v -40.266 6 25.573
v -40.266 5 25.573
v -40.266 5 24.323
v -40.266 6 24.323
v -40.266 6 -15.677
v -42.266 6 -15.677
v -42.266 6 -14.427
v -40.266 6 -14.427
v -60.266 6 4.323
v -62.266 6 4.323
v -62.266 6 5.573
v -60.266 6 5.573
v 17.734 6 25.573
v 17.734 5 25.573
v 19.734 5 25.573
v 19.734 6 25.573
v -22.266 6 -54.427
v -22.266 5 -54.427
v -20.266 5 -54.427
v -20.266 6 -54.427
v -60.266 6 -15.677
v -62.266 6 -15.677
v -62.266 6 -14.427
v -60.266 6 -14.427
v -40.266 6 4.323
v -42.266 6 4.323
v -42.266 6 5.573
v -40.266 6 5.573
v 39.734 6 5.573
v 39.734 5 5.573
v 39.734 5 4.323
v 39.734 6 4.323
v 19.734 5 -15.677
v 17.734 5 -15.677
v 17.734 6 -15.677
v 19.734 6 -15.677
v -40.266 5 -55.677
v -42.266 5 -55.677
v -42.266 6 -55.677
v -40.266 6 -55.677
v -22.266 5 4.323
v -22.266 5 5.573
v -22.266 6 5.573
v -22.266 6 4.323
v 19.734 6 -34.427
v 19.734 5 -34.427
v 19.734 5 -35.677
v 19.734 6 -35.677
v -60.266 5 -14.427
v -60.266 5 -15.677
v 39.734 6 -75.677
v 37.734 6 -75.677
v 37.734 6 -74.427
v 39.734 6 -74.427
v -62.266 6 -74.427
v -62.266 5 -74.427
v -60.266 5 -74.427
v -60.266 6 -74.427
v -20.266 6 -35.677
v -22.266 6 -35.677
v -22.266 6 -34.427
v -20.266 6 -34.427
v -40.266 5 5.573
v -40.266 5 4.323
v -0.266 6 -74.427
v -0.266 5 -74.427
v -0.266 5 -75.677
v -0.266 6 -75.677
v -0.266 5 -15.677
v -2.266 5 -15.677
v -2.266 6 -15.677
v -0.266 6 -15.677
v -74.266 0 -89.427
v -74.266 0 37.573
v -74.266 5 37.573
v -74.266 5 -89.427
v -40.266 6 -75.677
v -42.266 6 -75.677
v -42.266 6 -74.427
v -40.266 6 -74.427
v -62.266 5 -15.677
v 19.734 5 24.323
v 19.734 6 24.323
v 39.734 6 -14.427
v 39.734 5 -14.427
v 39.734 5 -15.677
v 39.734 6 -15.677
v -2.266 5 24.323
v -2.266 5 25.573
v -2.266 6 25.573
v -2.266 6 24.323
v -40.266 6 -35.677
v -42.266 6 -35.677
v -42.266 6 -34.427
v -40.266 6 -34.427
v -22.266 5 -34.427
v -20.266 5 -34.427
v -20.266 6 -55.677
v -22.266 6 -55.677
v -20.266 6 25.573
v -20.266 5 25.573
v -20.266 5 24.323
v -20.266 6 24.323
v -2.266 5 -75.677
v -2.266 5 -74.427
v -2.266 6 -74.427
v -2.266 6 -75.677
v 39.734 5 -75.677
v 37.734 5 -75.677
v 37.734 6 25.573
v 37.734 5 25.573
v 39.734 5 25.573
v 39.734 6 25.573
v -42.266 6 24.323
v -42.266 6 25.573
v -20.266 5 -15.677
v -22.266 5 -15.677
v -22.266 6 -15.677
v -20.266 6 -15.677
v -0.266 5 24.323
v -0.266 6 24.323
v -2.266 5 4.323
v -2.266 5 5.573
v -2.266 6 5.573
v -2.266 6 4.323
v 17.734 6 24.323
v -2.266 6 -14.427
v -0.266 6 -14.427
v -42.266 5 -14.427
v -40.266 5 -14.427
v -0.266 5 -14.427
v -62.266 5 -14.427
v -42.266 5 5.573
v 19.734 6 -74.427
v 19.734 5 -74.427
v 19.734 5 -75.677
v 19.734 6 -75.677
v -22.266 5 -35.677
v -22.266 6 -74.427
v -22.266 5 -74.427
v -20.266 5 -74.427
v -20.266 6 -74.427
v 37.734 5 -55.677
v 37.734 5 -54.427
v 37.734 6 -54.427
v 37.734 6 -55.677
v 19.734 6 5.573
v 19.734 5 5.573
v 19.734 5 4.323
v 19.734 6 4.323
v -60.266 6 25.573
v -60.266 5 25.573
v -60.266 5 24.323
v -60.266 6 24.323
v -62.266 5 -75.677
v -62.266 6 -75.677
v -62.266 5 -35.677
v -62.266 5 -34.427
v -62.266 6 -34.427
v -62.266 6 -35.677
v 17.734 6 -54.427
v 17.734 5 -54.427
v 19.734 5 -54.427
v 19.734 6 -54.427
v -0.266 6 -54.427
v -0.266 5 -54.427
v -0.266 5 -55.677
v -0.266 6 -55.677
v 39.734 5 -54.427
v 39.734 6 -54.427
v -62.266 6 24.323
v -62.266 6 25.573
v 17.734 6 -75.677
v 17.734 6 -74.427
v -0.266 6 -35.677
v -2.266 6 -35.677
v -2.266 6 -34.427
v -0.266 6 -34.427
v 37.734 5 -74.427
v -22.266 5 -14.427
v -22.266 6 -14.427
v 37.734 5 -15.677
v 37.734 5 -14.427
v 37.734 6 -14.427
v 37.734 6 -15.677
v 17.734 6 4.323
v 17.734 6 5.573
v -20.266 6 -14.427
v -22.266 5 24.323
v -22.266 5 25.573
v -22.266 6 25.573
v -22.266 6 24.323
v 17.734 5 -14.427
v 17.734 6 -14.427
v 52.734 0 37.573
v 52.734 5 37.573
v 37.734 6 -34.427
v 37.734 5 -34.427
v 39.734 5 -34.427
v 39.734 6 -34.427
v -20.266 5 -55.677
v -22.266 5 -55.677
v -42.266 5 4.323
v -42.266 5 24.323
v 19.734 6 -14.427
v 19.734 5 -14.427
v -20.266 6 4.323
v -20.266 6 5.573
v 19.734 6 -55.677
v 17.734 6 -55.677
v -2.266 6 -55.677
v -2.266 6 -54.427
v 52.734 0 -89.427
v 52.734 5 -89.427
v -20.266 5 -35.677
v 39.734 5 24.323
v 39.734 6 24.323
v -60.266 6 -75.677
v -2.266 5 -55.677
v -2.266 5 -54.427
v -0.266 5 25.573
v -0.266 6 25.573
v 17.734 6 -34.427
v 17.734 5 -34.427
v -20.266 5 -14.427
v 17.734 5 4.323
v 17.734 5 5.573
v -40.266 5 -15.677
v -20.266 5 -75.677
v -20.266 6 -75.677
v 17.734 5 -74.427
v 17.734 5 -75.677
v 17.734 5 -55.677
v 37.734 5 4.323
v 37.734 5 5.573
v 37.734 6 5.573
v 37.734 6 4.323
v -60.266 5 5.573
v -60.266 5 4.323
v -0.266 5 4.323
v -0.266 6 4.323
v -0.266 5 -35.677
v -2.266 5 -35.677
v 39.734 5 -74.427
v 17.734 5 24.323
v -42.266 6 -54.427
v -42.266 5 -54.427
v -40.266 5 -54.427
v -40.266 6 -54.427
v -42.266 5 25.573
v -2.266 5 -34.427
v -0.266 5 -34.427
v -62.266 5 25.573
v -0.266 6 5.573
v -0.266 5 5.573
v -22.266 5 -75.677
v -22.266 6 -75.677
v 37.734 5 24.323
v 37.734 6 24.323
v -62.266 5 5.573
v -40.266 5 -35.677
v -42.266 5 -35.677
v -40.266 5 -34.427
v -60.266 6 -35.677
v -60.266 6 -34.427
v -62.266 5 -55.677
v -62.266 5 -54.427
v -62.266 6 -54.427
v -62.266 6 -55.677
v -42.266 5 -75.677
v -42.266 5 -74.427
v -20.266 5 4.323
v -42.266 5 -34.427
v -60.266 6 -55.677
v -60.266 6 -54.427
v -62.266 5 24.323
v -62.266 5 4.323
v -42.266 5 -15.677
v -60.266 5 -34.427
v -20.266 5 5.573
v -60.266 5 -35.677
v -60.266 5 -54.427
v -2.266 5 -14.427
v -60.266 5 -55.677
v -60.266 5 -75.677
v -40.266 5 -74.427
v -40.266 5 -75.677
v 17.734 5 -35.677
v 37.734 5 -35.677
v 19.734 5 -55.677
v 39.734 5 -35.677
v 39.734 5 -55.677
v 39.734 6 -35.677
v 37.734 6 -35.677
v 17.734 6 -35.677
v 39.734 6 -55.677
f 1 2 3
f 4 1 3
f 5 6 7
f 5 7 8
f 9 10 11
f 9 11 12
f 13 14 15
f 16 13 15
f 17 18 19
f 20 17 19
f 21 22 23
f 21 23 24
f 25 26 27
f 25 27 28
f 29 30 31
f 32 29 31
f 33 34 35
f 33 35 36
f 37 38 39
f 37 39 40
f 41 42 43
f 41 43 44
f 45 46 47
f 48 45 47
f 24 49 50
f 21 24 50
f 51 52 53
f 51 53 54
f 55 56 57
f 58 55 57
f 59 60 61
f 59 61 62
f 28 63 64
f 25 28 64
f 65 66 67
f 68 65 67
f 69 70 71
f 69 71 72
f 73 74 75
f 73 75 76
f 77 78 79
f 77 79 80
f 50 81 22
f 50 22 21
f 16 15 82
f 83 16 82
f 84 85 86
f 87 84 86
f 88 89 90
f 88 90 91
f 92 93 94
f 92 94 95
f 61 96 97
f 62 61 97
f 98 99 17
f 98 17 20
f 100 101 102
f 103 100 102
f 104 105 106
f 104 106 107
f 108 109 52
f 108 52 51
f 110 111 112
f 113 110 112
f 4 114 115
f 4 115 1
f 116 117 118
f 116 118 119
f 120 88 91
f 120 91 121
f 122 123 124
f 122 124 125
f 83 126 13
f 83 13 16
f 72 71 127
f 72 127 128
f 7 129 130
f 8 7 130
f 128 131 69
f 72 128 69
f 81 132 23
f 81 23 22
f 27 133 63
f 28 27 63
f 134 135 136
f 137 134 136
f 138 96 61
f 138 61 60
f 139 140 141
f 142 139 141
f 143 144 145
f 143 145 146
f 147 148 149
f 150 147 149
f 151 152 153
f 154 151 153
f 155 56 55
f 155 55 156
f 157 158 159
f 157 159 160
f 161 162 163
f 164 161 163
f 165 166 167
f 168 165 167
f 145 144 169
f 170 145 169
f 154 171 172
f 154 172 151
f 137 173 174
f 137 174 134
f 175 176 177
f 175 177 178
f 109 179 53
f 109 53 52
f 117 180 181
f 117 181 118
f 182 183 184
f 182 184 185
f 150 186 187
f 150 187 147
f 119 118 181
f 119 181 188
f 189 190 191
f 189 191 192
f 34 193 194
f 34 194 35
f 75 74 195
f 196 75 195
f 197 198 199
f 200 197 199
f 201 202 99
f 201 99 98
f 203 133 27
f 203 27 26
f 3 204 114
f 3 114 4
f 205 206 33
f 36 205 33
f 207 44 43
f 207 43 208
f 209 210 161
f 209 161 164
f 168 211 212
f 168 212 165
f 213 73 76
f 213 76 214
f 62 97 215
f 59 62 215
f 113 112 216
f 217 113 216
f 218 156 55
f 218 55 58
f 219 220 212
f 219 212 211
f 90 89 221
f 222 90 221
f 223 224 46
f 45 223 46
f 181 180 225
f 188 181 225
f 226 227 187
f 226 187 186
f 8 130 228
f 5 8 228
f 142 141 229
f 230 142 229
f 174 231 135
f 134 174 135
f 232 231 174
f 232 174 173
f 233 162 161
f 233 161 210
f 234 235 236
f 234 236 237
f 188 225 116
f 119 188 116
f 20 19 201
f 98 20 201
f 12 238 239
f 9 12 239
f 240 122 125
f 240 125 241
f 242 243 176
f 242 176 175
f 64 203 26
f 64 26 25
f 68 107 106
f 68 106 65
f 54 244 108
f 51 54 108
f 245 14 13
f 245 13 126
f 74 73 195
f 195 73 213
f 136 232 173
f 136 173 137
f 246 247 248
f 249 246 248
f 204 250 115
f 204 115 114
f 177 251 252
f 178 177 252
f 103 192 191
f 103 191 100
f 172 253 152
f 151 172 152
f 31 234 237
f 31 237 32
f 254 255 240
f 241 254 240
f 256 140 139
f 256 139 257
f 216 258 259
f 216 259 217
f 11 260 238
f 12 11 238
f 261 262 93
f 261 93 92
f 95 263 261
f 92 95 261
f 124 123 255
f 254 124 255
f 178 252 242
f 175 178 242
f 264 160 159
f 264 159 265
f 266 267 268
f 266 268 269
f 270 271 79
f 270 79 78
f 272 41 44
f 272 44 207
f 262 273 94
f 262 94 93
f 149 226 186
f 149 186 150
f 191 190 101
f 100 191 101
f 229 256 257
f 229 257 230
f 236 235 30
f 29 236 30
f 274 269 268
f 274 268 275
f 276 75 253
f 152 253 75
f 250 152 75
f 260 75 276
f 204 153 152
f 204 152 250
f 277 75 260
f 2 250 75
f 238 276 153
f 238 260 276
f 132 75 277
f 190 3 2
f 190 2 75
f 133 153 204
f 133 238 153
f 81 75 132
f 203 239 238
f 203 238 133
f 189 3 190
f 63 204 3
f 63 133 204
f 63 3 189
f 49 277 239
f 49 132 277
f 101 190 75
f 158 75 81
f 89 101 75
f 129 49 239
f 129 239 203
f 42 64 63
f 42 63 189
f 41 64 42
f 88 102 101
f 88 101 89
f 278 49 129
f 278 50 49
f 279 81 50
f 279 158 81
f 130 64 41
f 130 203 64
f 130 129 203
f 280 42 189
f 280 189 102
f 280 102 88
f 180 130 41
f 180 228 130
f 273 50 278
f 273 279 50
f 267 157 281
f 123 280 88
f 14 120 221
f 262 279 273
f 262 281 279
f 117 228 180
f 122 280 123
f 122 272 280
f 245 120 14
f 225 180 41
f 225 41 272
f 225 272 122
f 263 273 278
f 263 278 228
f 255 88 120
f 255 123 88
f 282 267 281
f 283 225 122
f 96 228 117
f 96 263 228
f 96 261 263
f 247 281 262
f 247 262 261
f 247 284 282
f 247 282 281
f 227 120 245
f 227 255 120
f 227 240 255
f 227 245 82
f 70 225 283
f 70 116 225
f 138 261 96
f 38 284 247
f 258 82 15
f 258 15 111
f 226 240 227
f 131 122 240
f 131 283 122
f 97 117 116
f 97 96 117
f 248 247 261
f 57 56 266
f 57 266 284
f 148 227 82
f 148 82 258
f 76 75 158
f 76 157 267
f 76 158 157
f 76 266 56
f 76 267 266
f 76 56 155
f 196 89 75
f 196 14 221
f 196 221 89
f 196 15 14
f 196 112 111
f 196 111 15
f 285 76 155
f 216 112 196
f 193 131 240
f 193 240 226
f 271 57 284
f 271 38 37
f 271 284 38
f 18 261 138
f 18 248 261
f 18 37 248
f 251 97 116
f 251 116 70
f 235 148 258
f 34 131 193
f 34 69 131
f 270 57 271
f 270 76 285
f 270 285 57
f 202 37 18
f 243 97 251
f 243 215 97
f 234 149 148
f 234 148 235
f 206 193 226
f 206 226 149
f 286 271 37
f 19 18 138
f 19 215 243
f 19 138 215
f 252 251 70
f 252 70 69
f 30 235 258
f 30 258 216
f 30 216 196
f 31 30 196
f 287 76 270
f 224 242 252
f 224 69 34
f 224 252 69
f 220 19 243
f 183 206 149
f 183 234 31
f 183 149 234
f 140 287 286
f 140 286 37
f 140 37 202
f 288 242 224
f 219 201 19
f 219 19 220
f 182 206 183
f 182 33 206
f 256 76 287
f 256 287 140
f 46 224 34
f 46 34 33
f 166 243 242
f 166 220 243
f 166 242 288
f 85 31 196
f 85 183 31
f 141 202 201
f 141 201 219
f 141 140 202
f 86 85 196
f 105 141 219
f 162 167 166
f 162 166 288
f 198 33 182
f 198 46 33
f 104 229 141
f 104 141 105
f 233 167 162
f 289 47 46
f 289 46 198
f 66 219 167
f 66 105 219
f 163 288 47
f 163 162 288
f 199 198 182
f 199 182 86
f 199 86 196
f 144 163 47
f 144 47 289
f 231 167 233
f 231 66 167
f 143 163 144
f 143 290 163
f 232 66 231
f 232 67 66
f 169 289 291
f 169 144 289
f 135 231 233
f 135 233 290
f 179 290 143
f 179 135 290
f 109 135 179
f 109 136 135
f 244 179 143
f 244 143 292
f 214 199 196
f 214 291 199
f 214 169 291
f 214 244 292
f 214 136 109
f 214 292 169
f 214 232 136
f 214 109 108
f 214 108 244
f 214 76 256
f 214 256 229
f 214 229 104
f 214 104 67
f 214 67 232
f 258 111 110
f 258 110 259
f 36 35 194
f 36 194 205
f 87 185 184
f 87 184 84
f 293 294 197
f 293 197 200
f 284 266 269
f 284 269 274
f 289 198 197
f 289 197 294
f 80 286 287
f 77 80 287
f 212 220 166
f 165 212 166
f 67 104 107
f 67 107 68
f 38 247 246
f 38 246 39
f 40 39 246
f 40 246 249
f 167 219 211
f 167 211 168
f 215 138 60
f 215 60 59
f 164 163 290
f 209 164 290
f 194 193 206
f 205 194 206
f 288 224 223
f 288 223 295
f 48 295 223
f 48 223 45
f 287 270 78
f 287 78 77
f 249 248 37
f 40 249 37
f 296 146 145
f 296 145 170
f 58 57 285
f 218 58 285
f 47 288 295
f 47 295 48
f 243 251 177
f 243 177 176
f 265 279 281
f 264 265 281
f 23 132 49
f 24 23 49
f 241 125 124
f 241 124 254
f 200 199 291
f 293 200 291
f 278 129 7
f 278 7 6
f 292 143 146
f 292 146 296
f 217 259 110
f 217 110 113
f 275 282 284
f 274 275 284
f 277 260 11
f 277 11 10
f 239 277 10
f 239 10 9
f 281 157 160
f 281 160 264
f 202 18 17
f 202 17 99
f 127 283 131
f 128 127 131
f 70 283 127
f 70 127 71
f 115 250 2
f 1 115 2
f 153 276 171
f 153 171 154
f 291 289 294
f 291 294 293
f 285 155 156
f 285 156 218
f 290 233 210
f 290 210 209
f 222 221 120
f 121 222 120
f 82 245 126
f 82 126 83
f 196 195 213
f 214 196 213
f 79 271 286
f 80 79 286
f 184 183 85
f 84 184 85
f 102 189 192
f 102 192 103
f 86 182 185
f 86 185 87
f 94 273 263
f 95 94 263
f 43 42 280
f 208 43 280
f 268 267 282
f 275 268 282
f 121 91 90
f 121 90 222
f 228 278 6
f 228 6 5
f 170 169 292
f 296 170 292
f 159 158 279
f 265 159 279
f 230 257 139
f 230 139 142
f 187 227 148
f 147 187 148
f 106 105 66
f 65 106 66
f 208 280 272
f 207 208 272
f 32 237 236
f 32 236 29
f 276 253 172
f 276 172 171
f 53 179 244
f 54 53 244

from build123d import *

# Parameters (mm, degrees)
SKETCH4_W           = 127
SKETCH4_H           = 127
BOSS_EXTRUDE5_DEPTH = 5
SKETCH5_W           = 2
SKETCH5_H           = 1.25
BOSS_EXTRUDE6_DEPTH = 1


with BuildPart() as part:
    # Sketch4 → Boss-Extrude5 (new body)
    with BuildSketch(Plane(origin=(0, 0, 0), x_dir=(1, 0, 0), z_dir=(0, 1, 0))):
        with Locations((-10.766435986, 25.92733564)):
            Rectangle(SKETCH4_W, SKETCH4_H)
    extrude(amount=BOSS_EXTRUDE5_DEPTH)

    # Sketch5 → Boss-Extrude6 (add)
    with BuildSketch(Plane(origin=(0, 5, 0), x_dir=(1, 0, 0), z_dir=(0, 1, 0))):
        with Locations((-41.266435986, -24.94766436)):
            Rectangle(SKETCH5_W, SKETCH5_H)
        with Locations((-61.266435986, -24.94766436)):
            Rectangle(SKETCH5_W, SKETCH5_H)
        with Locations((-21.266435986, -24.94766436)):
            Rectangle(SKETCH5_W, SKETCH5_H)
        with Locations((-1.266435986, -24.94766436)):
            Rectangle(SKETCH5_W, SKETCH5_H)
        with Locations((18.733564014, -24.94766436)):
            Rectangle(SKETCH5_W, SKETCH5_H)
        with Locations((38.733564014, -24.94766436)):
            Rectangle(SKETCH5_W, SKETCH5_H)
        with Locations((-41.266435986, -4.94766436)):
            Rectangle(SKETCH5_W, SKETCH5_H)
        with Locations((-21.266435986, -4.94766436)):
            Rectangle(SKETCH5_W, SKETCH5_H)
        with Locations((-1.266435986, -4.94766436)):
            Rectangle(SKETCH5_W, SKETCH5_H)
        with Locations((18.733564014, -4.94766436)):
            Rectangle(SKETCH5_W, SKETCH5_H)
        with Locations((38.733564014, -4.94766436)):
            Rectangle(SKETCH5_W, SKETCH5_H)
        with Locations((-41.266435986, 15.05233564)):
            Rectangle(SKETCH5_W, SKETCH5_H)
        with Locations((-21.266435986, 15.05233564)):
            Rectangle(SKETCH5_W, SKETCH5_H)
        with Locations((-1.266435986, 15.05233564)):
            Rectangle(SKETCH5_W, SKETCH5_H)
        with Locations((18.733564014, 15.05233564)):
            Rectangle(SKETCH5_W, SKETCH5_H)
        with Locations((38.733564014, 15.05233564)):
            Rectangle(SKETCH5_W, SKETCH5_H)
        with Locations((-41.266435986, 35.05233564)):
            Rectangle(SKETCH5_W, SKETCH5_H)
        with Locations((-21.266435986, 35.05233564)):
            Rectangle(SKETCH5_W, SKETCH5_H)
        with Locations((-1.266435986, 35.05233564)):
            Rectangle(SKETCH5_W, SKETCH5_H)
        with Locations((18.733564014, 35.05233564)):
            Rectangle(SKETCH5_W, SKETCH5_H)
        with Locations((38.733564014, 35.05233564)):
            Rectangle(SKETCH5_W, SKETCH5_H)
        with Locations((-41.266435986, 55.05233564)):
            Rectangle(SKETCH5_W, SKETCH5_H)
        with Locations((-21.266435986, 55.05233564)):
            Rectangle(SKETCH5_W, SKETCH5_H)
        with Locations((-1.266435986, 55.05233564)):
            Rectangle(SKETCH5_W, SKETCH5_H)
        with Locations((18.733564014, 55.05233564)):
            Rectangle(SKETCH5_W, SKETCH5_H)
        with Locations((38.733564014, 55.05233564)):
            Rectangle(SKETCH5_W, SKETCH5_H)
        with Locations((-41.266435986, 75.05233564)):
            Rectangle(SKETCH5_W, SKETCH5_H)
        with Locations((-21.266435986, 75.05233564)):
            Rectangle(SKETCH5_W, SKETCH5_H)
        with Locations((-1.266435986, 75.05233564)):
            Rectangle(SKETCH5_W, SKETCH5_H)
        with Locations((18.733564014, 75.05233564)):
            Rectangle(SKETCH5_W, SKETCH5_H)
        with Locations((38.733564014, 75.05233564)):
            Rectangle(SKETCH5_W, SKETCH5_H)
        with Locations((-61.266435986, -4.94766436)):
            Rectangle(SKETCH5_W, SKETCH5_H)
        with Locations((-61.266435986, 15.05233564)):
            Rectangle(SKETCH5_W, SKETCH5_H)
        with Locations((-61.266435986, 35.05233564)):
            Rectangle(SKETCH5_W, SKETCH5_H)
        with Locations((-61.266435986, 55.05233564)):
            Rectangle(SKETCH5_W, SKETCH5_H)
        with Locations((-61.266435986, 75.05233564)):
            Rectangle(SKETCH5_W, SKETCH5_H)
    extrude(amount=BOSS_EXTRUDE6_DEPTH)


solid = part.part
